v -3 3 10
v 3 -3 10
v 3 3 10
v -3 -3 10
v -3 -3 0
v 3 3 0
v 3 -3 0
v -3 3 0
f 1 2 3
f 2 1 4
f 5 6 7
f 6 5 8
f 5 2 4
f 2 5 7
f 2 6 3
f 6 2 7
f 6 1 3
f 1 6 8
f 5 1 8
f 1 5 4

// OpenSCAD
translate([0, 0, 5]) color([0,1,0,0.9]) cube([6, 6, 10], center=true);
